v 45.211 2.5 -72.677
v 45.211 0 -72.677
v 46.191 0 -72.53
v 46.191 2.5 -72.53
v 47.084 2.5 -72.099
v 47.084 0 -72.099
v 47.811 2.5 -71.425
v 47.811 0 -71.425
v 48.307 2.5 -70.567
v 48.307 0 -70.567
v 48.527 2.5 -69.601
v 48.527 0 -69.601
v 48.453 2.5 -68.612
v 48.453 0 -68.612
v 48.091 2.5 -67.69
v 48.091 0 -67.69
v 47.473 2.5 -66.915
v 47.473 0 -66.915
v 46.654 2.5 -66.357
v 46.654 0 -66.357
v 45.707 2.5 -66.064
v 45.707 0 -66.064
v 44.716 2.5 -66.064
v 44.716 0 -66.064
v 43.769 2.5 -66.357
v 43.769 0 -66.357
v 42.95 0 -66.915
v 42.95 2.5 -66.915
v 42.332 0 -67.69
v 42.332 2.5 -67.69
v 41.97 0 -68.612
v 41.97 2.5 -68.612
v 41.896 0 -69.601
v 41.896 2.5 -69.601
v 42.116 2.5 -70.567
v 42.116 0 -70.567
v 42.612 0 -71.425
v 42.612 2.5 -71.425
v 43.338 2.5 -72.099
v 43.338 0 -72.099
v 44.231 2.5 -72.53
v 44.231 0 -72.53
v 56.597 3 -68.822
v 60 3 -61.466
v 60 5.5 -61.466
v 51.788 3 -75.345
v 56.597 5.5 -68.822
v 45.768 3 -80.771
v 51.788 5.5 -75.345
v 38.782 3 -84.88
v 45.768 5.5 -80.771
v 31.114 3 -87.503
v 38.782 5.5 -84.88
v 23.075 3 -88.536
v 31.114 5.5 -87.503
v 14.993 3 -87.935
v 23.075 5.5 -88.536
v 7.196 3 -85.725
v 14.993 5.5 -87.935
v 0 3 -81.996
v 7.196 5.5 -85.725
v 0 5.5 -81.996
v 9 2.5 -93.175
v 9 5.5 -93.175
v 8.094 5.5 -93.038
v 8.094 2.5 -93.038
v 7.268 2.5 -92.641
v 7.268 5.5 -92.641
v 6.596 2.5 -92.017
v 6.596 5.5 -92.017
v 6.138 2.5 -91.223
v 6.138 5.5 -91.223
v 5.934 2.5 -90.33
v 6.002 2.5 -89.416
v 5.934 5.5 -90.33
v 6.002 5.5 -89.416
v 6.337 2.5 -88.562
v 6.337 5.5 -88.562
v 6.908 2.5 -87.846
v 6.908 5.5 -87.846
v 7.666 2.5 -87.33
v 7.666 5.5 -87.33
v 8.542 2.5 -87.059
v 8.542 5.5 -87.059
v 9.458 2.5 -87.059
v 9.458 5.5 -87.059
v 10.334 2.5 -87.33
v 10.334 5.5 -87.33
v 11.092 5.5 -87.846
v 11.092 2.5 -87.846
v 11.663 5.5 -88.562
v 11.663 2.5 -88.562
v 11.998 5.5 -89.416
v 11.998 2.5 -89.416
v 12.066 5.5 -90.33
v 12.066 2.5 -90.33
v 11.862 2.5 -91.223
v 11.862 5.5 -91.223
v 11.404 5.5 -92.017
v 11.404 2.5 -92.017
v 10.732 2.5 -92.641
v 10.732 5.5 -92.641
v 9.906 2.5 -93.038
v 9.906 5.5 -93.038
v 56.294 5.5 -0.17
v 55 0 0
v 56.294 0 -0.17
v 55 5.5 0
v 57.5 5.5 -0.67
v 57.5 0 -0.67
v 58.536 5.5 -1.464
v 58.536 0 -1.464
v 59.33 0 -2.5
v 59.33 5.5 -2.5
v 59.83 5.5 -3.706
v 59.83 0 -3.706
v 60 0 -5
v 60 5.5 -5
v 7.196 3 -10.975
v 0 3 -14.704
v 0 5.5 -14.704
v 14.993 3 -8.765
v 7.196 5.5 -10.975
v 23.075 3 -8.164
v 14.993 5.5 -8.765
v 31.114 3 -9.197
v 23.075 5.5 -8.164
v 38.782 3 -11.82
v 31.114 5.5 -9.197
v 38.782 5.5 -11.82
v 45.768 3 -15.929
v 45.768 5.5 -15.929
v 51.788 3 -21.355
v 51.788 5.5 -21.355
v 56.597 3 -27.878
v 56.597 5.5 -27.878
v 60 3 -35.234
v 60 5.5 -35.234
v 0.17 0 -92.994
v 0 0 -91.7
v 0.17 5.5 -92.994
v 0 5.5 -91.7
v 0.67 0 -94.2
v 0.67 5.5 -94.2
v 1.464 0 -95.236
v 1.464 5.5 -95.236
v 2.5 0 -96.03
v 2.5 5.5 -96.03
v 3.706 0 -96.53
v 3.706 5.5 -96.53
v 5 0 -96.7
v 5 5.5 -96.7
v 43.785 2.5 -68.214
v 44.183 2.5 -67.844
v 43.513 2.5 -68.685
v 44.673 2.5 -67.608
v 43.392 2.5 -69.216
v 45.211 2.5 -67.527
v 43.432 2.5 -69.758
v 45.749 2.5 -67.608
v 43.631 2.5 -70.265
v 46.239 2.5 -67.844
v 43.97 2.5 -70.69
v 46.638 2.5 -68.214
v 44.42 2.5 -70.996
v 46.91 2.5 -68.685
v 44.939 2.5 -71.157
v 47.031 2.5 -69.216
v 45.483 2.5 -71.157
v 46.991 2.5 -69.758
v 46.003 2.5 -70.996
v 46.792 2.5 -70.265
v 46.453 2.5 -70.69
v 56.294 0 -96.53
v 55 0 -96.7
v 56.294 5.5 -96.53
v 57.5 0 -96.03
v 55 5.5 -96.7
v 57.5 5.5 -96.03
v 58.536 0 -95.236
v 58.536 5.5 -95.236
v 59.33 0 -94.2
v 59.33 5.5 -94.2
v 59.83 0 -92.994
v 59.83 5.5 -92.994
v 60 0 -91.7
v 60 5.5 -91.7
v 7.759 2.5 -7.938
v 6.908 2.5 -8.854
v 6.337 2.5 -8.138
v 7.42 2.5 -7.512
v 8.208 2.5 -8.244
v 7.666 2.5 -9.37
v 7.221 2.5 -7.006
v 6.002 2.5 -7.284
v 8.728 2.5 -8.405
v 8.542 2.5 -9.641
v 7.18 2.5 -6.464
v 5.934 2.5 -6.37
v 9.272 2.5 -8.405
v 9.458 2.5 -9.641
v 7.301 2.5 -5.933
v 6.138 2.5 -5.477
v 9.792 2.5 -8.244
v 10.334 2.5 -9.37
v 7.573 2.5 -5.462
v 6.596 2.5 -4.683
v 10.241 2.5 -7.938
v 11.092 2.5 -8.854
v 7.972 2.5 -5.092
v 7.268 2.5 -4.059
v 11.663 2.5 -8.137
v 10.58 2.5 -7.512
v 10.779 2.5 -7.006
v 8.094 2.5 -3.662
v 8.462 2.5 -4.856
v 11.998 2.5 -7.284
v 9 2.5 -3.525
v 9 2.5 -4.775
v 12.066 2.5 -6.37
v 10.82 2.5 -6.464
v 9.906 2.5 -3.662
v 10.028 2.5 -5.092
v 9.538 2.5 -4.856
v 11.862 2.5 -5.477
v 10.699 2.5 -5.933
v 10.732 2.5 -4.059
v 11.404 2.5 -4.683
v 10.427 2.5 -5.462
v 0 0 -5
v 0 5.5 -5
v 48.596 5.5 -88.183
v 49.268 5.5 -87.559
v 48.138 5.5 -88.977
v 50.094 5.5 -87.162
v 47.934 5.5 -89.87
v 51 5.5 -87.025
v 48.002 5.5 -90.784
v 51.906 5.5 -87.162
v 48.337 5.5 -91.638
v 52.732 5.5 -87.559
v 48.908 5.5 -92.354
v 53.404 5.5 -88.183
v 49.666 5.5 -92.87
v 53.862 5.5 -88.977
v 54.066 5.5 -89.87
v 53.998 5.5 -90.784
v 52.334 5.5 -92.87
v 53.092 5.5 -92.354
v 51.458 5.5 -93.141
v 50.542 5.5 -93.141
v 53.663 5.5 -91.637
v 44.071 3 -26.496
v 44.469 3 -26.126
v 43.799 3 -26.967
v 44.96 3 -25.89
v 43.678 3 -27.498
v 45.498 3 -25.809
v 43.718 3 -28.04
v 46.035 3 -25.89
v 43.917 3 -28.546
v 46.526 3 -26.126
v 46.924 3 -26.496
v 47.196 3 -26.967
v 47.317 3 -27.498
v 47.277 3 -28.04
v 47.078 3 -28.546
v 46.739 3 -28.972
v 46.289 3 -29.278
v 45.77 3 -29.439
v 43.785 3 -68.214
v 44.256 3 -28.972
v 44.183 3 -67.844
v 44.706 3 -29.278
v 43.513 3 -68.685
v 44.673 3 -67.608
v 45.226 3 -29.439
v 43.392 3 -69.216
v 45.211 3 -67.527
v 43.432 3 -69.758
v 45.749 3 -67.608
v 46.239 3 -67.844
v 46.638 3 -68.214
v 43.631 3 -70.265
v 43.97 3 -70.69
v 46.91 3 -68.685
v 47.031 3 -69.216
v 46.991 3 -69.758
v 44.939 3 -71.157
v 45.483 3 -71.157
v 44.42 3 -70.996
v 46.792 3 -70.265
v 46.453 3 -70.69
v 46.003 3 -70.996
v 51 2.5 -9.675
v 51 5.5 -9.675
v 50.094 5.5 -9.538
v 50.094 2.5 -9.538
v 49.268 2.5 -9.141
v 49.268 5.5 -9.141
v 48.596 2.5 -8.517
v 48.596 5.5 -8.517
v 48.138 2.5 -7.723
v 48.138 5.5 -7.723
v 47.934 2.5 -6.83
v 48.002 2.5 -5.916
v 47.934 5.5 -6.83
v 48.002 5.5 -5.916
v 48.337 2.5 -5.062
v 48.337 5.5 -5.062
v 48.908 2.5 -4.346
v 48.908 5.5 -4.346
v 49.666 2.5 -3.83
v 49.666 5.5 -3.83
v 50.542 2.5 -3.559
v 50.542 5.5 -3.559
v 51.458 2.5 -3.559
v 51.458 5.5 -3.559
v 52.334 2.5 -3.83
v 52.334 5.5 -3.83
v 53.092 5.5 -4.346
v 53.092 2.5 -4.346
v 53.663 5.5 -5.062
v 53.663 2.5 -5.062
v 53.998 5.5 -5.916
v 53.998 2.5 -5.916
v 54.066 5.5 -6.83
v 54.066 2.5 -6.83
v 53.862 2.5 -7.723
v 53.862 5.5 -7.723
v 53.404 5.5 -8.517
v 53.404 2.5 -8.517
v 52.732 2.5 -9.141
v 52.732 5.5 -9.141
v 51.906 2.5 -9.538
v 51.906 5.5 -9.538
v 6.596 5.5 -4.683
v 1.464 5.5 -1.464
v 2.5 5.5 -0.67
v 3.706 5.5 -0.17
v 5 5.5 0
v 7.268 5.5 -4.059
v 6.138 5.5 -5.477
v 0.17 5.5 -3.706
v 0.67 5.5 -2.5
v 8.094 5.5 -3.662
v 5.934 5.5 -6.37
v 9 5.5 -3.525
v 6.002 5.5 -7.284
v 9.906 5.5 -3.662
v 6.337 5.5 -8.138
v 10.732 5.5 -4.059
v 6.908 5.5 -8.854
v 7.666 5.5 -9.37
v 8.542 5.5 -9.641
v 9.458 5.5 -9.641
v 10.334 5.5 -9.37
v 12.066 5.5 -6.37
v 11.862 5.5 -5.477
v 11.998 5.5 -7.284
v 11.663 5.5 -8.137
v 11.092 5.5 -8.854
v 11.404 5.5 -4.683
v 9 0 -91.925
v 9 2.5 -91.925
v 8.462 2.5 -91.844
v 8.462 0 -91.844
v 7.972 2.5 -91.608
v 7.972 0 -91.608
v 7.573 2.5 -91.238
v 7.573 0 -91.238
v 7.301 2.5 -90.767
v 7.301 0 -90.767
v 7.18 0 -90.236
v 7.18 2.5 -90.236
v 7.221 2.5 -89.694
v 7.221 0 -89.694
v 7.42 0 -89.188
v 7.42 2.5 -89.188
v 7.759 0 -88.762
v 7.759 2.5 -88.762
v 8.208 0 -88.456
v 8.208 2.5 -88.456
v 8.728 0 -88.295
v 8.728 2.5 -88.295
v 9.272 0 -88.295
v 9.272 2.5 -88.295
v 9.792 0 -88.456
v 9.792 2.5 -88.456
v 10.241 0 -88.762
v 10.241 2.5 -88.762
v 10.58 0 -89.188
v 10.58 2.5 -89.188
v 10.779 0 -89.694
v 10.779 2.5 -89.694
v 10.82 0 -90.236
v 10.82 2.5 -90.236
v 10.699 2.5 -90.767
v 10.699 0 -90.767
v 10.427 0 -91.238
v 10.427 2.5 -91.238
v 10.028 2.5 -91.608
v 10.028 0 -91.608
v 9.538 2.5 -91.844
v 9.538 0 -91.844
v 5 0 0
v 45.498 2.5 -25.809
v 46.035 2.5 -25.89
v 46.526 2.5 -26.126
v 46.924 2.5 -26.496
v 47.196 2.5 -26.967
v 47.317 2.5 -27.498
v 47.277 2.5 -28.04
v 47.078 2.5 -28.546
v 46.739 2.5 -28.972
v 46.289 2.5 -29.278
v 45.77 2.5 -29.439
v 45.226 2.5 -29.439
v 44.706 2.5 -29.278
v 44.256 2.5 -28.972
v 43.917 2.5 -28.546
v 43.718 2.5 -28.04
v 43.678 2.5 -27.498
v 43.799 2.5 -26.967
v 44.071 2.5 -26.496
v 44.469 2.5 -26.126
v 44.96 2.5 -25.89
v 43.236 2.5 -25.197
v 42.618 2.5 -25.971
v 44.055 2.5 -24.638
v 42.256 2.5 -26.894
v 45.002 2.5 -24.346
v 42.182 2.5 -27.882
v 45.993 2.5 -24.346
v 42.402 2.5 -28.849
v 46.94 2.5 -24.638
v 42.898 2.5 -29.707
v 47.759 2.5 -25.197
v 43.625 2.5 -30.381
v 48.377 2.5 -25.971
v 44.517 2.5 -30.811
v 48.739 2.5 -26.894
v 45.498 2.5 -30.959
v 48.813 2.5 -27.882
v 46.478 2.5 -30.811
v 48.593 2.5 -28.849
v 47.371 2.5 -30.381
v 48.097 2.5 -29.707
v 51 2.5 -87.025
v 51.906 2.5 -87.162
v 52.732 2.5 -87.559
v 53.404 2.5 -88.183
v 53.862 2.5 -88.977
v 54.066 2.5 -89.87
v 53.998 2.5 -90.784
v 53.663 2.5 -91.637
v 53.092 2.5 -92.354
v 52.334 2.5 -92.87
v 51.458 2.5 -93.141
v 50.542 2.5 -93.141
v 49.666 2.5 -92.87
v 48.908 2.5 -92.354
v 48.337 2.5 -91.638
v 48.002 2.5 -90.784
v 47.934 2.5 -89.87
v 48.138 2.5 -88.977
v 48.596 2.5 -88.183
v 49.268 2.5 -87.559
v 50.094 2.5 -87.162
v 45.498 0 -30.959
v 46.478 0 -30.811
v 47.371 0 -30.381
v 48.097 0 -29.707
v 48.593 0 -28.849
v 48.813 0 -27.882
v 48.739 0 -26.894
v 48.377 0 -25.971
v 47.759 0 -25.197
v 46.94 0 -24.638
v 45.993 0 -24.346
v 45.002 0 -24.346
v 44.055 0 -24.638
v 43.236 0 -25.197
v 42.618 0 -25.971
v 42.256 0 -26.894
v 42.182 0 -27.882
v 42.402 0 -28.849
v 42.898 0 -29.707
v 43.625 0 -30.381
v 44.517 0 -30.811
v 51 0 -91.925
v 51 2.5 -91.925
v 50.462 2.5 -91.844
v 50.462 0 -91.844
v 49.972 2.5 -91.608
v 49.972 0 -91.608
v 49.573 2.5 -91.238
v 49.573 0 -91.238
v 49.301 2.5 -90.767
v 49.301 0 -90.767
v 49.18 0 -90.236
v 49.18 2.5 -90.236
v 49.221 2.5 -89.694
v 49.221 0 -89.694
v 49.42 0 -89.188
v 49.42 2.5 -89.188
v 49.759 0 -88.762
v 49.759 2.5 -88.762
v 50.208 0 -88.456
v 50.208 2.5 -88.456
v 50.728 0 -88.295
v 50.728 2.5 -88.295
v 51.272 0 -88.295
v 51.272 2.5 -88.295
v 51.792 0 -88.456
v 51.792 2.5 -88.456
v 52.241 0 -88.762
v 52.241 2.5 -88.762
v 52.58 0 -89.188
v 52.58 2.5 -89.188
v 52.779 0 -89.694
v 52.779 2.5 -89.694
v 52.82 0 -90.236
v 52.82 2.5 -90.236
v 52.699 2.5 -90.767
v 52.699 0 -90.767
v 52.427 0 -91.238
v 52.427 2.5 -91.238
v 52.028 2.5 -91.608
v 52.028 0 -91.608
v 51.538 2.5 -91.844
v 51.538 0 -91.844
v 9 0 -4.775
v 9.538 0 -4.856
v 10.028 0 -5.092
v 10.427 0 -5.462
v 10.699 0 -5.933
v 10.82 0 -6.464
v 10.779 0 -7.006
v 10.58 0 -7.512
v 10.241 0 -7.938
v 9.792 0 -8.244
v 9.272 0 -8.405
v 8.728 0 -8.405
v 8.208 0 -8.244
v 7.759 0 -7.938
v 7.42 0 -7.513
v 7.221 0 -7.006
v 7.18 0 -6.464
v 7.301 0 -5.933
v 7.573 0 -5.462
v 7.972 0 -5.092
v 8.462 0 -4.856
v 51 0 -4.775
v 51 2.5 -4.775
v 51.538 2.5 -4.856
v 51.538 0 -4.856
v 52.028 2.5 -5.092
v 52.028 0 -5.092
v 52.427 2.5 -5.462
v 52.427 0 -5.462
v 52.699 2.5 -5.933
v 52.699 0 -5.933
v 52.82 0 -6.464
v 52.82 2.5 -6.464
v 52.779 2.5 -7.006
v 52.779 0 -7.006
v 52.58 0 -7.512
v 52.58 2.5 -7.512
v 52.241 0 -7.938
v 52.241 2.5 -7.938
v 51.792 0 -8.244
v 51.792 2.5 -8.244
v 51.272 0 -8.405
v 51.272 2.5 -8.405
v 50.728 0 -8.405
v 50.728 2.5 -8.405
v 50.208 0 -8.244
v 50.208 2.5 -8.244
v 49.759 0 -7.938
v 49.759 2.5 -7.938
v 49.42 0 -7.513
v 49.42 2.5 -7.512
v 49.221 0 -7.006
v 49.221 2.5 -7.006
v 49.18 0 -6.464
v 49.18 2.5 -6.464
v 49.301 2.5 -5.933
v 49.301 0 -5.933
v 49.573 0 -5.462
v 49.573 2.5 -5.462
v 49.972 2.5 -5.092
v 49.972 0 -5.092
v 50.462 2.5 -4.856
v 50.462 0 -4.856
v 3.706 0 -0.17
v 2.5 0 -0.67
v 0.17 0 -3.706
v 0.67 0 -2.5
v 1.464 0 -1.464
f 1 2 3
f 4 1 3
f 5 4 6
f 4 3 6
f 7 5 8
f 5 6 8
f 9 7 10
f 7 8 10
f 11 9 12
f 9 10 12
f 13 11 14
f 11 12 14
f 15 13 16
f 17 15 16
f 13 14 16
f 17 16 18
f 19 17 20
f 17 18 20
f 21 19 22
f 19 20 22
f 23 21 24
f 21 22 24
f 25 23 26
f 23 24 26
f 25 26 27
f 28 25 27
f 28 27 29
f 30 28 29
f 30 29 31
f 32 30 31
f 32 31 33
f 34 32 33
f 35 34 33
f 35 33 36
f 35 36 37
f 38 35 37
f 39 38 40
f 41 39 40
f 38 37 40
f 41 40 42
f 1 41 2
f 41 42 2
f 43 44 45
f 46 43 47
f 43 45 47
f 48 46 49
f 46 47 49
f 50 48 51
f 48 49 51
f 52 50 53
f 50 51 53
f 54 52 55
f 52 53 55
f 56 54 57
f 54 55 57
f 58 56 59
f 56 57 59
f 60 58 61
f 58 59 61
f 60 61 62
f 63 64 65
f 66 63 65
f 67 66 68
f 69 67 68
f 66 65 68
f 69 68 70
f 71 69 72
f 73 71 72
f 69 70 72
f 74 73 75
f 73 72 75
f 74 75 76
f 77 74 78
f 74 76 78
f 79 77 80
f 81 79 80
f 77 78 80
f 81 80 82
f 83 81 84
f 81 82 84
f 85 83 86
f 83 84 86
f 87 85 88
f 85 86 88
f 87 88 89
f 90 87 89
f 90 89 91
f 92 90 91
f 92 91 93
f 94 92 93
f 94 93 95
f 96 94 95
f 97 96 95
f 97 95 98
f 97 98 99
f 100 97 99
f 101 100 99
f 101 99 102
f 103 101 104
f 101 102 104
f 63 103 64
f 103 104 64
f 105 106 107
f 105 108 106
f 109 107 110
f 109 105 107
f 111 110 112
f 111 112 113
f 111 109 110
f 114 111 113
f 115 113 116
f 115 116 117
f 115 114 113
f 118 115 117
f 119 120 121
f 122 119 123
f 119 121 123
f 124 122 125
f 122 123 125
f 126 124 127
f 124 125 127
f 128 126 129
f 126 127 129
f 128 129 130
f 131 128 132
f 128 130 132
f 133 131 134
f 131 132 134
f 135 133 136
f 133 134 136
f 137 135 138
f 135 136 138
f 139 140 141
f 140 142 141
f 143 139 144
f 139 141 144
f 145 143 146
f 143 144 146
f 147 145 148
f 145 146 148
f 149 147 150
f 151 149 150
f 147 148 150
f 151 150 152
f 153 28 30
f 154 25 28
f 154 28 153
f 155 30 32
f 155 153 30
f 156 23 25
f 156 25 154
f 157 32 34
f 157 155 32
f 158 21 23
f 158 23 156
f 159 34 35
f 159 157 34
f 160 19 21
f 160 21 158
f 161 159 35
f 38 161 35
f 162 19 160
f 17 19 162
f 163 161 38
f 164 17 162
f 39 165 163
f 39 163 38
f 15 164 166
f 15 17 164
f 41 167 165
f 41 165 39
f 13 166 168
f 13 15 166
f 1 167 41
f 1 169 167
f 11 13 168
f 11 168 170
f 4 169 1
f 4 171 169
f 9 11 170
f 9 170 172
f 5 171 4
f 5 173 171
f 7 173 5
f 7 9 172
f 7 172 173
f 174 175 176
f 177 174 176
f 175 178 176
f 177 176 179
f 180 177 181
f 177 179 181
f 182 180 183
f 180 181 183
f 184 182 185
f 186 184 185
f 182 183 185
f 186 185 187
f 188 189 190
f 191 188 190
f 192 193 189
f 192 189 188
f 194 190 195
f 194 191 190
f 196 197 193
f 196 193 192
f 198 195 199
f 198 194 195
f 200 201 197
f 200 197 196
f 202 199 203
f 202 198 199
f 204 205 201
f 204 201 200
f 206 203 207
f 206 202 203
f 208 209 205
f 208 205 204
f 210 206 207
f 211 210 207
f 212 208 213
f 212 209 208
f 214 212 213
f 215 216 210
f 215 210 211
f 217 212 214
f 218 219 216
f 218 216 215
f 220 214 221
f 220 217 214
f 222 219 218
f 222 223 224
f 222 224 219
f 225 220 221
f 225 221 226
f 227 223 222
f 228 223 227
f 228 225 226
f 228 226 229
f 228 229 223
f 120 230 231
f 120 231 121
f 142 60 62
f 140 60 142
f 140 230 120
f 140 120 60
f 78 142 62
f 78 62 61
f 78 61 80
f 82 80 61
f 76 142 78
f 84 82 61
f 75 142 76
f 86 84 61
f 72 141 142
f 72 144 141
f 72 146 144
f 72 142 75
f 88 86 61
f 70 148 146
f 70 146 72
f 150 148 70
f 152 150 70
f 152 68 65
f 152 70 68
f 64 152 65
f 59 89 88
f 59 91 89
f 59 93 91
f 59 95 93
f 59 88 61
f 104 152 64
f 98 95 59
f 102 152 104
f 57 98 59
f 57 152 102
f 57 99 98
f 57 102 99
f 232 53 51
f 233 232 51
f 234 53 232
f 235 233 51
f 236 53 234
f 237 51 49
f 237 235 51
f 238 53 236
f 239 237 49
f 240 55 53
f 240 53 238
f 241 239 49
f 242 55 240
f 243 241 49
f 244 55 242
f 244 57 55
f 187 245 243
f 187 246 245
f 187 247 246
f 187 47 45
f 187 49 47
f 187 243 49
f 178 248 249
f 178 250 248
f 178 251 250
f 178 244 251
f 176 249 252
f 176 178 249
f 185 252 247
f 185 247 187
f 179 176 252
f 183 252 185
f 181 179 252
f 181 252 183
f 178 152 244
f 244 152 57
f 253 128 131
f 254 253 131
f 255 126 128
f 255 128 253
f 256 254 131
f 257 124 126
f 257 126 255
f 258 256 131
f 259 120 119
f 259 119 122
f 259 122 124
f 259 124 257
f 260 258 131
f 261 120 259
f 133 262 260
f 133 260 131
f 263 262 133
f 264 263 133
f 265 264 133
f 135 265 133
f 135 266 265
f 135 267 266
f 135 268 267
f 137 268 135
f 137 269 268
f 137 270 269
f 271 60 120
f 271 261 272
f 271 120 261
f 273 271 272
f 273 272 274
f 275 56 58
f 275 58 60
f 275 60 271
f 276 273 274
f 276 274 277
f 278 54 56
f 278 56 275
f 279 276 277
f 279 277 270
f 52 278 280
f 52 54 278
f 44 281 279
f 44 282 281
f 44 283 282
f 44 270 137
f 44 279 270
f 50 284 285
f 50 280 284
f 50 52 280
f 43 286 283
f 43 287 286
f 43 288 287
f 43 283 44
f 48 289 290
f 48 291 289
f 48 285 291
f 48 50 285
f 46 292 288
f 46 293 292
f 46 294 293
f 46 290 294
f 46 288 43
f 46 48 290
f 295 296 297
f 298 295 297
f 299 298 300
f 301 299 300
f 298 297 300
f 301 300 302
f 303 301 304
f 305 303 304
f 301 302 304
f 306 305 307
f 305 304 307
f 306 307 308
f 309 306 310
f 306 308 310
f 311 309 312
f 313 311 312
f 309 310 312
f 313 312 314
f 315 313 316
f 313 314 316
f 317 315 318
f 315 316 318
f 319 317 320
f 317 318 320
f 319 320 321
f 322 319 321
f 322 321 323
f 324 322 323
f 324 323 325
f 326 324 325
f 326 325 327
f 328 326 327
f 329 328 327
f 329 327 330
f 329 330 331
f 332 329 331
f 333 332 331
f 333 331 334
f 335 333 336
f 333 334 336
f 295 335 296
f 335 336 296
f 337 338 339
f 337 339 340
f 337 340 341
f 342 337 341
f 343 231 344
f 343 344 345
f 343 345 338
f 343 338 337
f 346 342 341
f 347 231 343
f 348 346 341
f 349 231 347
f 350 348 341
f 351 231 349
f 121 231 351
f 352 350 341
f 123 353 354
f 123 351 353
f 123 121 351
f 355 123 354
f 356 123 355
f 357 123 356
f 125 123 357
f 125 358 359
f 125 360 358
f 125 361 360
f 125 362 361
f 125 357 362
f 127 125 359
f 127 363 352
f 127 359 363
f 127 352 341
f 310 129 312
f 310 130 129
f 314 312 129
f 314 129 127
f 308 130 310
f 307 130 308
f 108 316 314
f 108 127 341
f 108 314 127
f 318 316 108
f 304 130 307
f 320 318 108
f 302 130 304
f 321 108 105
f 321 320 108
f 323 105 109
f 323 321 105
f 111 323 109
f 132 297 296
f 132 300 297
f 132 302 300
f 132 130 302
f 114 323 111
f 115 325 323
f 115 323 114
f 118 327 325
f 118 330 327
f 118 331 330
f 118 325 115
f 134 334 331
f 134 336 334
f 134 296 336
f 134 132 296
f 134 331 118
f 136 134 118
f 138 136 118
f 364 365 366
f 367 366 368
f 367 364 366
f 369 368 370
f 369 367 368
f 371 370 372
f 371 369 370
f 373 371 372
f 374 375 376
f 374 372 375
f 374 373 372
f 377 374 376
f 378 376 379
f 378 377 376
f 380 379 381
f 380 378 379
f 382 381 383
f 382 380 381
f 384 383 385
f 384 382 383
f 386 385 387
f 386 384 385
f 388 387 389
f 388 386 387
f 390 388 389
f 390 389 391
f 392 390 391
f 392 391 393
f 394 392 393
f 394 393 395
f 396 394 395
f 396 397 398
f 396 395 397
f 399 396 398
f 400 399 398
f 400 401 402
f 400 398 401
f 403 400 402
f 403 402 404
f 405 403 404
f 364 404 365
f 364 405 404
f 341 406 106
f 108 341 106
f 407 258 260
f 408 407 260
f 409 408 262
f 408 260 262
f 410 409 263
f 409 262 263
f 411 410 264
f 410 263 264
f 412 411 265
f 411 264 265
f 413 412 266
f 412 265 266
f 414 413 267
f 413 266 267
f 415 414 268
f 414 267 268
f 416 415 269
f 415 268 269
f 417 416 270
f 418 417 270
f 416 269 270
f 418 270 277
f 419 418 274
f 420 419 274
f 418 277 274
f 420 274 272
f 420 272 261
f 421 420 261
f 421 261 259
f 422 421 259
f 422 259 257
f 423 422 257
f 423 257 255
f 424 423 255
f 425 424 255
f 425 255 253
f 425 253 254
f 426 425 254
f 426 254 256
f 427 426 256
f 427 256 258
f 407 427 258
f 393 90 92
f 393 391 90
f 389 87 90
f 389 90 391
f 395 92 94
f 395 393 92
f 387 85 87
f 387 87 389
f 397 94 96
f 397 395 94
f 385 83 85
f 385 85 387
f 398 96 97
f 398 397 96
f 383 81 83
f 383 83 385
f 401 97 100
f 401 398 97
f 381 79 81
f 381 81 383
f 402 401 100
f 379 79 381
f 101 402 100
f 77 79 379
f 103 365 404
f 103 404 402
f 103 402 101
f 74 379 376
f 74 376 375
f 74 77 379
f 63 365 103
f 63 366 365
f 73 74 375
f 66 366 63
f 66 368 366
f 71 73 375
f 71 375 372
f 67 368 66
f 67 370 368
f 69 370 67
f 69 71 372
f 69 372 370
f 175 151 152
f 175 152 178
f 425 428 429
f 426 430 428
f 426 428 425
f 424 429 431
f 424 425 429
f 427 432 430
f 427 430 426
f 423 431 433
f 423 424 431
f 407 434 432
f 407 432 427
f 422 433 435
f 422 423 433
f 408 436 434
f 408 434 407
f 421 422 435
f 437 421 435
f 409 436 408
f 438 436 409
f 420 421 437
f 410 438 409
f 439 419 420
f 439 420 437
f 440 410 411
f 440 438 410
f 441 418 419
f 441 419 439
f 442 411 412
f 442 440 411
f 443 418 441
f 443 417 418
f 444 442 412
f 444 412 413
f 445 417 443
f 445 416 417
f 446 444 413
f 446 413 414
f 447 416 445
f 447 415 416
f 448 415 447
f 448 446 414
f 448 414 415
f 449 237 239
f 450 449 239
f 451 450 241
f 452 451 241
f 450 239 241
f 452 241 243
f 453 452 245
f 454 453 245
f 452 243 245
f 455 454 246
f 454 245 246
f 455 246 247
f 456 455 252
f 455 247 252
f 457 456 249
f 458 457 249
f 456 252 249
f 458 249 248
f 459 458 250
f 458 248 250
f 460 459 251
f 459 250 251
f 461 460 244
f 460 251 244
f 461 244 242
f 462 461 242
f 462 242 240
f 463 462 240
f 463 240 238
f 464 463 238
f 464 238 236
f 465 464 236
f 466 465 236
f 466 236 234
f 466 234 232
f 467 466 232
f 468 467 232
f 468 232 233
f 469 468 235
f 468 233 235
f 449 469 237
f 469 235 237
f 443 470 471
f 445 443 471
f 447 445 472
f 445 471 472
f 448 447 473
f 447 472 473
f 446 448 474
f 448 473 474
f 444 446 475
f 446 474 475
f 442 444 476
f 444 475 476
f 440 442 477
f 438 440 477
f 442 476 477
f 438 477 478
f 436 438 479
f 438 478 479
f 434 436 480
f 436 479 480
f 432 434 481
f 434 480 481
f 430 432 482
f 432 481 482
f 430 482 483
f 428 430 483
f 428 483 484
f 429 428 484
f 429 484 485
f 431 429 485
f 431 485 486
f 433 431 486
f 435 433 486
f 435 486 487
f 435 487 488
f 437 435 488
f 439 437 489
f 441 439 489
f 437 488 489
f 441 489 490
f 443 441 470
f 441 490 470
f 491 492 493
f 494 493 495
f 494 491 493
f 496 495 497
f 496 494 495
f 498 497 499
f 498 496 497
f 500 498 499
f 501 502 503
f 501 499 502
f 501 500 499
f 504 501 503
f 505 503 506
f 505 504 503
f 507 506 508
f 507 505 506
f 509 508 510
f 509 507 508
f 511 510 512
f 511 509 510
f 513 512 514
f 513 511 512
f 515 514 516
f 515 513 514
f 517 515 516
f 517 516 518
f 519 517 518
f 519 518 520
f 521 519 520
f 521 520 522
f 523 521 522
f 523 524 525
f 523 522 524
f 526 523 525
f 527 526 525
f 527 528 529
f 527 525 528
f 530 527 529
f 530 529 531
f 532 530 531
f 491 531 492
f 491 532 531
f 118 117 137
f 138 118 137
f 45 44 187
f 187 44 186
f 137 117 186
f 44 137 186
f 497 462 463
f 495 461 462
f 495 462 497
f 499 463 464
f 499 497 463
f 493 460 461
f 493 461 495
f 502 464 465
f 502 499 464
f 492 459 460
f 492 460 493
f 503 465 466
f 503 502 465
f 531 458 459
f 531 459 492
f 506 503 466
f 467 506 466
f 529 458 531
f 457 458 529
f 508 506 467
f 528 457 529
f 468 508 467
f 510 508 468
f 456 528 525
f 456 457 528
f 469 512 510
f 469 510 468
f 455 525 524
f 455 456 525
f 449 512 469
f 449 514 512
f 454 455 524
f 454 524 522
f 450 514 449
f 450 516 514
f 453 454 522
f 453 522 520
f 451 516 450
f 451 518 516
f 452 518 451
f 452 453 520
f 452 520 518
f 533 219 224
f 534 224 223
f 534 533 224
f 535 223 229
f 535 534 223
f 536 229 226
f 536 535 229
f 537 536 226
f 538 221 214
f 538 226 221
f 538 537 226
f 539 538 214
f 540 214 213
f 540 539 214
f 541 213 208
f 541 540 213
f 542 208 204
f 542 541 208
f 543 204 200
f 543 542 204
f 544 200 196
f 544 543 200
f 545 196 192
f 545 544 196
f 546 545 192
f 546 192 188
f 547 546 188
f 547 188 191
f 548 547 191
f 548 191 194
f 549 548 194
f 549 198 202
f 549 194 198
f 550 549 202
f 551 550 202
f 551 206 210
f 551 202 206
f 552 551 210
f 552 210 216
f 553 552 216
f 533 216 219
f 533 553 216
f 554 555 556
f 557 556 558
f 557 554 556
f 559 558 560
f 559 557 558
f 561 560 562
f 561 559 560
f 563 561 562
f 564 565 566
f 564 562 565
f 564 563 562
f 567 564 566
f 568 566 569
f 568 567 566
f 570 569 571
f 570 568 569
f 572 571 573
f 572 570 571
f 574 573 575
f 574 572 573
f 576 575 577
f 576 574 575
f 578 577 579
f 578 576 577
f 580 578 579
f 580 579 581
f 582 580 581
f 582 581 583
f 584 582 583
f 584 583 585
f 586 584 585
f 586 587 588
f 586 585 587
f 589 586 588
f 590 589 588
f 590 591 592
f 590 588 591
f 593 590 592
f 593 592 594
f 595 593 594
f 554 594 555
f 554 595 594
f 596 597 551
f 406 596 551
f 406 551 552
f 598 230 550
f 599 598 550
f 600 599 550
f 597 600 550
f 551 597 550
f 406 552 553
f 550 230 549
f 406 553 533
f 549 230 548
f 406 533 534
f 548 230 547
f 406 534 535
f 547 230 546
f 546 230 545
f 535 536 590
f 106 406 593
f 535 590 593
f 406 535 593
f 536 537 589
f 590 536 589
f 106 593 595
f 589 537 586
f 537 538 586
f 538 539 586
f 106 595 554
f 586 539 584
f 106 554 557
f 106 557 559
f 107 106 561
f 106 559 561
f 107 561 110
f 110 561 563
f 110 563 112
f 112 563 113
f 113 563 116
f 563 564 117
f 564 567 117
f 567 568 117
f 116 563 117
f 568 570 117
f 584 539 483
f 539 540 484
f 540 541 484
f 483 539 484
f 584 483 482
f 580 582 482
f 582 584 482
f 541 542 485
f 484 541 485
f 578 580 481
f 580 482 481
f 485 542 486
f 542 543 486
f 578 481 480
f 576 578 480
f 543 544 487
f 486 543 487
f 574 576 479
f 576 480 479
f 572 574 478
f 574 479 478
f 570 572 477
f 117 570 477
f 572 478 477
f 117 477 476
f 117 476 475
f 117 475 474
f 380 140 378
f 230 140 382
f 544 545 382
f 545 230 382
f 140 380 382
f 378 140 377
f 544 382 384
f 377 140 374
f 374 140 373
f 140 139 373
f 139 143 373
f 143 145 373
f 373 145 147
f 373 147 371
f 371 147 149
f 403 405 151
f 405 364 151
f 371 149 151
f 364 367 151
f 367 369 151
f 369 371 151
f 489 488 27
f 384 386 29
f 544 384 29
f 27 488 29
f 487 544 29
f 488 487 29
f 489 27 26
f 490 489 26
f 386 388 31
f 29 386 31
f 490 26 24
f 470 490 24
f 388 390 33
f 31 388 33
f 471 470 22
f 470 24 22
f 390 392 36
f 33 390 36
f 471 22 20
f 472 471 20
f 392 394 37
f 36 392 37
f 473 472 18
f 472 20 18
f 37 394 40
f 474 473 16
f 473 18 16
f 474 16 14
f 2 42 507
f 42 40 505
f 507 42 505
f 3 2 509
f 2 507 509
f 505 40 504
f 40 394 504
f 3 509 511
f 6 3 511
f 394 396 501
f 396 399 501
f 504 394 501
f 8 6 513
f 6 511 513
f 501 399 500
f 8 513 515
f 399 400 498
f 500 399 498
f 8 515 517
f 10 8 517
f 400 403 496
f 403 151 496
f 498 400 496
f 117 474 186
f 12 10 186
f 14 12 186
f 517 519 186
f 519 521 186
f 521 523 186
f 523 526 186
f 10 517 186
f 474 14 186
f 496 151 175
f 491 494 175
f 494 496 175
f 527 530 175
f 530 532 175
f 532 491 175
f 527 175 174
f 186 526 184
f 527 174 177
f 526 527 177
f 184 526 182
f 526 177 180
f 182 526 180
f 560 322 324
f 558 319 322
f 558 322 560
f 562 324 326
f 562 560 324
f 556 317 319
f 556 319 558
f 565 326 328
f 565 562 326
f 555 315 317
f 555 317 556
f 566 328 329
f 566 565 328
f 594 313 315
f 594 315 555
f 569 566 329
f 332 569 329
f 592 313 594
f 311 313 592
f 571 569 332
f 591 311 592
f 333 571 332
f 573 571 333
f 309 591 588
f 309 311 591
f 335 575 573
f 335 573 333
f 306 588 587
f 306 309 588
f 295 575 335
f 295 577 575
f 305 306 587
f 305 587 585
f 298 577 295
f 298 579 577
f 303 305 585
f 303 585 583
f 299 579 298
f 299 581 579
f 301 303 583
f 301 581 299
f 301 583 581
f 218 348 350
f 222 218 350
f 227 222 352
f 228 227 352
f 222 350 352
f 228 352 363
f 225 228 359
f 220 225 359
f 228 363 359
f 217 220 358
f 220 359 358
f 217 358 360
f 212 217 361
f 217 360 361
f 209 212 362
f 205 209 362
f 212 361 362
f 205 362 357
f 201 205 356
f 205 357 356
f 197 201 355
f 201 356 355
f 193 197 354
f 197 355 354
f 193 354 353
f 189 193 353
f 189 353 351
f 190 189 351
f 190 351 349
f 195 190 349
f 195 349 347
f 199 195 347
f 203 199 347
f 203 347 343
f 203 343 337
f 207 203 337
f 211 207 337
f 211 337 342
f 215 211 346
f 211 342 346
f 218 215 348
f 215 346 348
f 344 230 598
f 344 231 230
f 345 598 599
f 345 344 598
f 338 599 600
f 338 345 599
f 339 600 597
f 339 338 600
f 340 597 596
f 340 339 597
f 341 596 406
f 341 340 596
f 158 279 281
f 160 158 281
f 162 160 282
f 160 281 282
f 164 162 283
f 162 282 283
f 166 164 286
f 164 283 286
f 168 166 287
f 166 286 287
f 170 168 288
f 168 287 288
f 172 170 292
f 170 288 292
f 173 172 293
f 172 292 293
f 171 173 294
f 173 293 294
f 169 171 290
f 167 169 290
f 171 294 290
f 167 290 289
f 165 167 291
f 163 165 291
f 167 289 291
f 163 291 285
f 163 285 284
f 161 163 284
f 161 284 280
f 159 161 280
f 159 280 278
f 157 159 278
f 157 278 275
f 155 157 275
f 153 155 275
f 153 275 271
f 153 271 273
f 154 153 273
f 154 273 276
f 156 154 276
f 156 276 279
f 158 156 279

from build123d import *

# Parameters (mm, degrees)
CROQUIS2_W              = 60
CROQUIS2_H              = 96.7
CROQUIS2_R              = 1.825
SALIENTE_EXTRUIR1_DEPTH = 5.5
REDONDEO2_R             = 5
CROQUIS4_R              = 39.5
CORTAR_EXTRUIR1_DEPTH   = 2.5
CROQUIS5_R              = 1.825
CORTAR_EXTRUIR2_DEPTH   = 114.841512639
CROQUIS6_R              = 3.325
CORTAR_EXTRUIR3_DEPTH   = 2.5
CROQUIS7_R              = 3.075
CORTAR_EXTRUIR4_DEPTH   = 3
CROQUIS10_R             = 40.2
CORTAR_EXTRUIR5_DEPTH   = 2.5


with BuildPart() as part:
    # Croquis2 → Saliente-Extruir1 (new body)
    with BuildSketch(Plane(origin=(0, 0, 0), x_dir=(1, 0, 0), z_dir=(0, 1, 0))):
        with Locations((30, 48.35)):
            Rectangle(CROQUIS2_W, CROQUIS2_H)
        with Locations(Location((9, 6.6, 0), (0, 0, 270))):
            Circle(CROQUIS2_R, mode=Mode.SUBTRACT)
        with Locations(Location((51, 6.6, 0), (0, 0, 270))):
            Circle(CROQUIS2_R, mode=Mode.SUBTRACT)
        with Locations(Location((9, 90.1, 0), (0, 0, 90))):
            Circle(CROQUIS2_R, mode=Mode.SUBTRACT)
        with Locations(Location((51, 90.1, 0), (0, 0, 90))):
            Circle(CROQUIS2_R, mode=Mode.SUBTRACT)
    extrude(amount=SALIENTE_EXTRUIR1_DEPTH)

    # Redondeo2
    redondeo2_edges = [part.edges().sort_by_distance(p)[0] for p in [
        (0, 2.75, -96.7),
        (60, 2.75, -96.7),
        (60, 2.75, 0),
        (0, 2.75, 0),
    ]]
    fillet(redondeo2_edges, radius=REDONDEO2_R)

    # Croquis4 → Cortar-Extruir1 (cut)
    with BuildSketch(Plane(origin=(0, 5.5, 0), x_dir=(1, 0, 0), z_dir=(0, 1, 0))):
        with Locations((22, 48.35)):
            Circle(CROQUIS4_R)
    extrude(amount=-CORTAR_EXTRUIR1_DEPTH, mode=Mode.SUBTRACT)

    # Croquis5 → Cortar-Extruir2 (cut, through all)
    with BuildSketch(Plane(origin=(0, 3, 0), x_dir=(1, 0, 0), z_dir=(0, 1, 0))):
        with Locations(Location((45.211409163, 69.352226887, 0), (0, 0, 270))):
            Circle(CROQUIS5_R)
        with Locations(Location((45.497544097, 27.633908047, 0), (0, 0, 270))):
            Circle(CROQUIS5_R)
    extrude(amount=-CORTAR_EXTRUIR2_DEPTH, mode=Mode.SUBTRACT)

    # Croquis6 → Cortar-Extruir3 (cut)
    with BuildSketch(Plane.XZ):
        with Locations(Location((45.497544097, -27.633908047, 0), (0, 0, 270))):
            Circle(CROQUIS6_R)
        with Locations(Location((45.211409163, -69.352226887, 0), (0, 0, 270))):
            Circle(CROQUIS6_R)
    extrude(amount=-CORTAR_EXTRUIR3_DEPTH, mode=Mode.SUBTRACT)

    # Croquis7 → Cortar-Extruir4 (cut)
    with BuildSketch(Plane(origin=(0, 5.5, 0), x_dir=(1, 0, 0), z_dir=(0, 1, 0))):
        with Locations(Location((51, 90.1, 0), (0, 0, 270))):
            Circle(CROQUIS7_R)
        with Locations(Location((9, 90.1, 0), (0, 0, 90))):
            Circle(CROQUIS7_R)
        with Locations(Location((51, 6.6, 0), (0, 0, 90))):
            Circle(CROQUIS7_R)
        with Locations(Location((9, 6.6, 0), (0, 0, 270))):
            Circle(CROQUIS7_R)
    extrude(amount=-CORTAR_EXTRUIR4_DEPTH, mode=Mode.SUBTRACT)

    # Croquis10 → Cortar-Extruir5 (cut)
    with BuildSketch(Plane(origin=(0, 5.5, 0), x_dir=(1, 0, 0), z_dir=(0, 1, 0))):
        with Locations((22, 48.35)):
            Circle(CROQUIS10_R)
    extrude(amount=-CORTAR_EXTRUIR5_DEPTH, mode=Mode.SUBTRACT)


solid = part.part
